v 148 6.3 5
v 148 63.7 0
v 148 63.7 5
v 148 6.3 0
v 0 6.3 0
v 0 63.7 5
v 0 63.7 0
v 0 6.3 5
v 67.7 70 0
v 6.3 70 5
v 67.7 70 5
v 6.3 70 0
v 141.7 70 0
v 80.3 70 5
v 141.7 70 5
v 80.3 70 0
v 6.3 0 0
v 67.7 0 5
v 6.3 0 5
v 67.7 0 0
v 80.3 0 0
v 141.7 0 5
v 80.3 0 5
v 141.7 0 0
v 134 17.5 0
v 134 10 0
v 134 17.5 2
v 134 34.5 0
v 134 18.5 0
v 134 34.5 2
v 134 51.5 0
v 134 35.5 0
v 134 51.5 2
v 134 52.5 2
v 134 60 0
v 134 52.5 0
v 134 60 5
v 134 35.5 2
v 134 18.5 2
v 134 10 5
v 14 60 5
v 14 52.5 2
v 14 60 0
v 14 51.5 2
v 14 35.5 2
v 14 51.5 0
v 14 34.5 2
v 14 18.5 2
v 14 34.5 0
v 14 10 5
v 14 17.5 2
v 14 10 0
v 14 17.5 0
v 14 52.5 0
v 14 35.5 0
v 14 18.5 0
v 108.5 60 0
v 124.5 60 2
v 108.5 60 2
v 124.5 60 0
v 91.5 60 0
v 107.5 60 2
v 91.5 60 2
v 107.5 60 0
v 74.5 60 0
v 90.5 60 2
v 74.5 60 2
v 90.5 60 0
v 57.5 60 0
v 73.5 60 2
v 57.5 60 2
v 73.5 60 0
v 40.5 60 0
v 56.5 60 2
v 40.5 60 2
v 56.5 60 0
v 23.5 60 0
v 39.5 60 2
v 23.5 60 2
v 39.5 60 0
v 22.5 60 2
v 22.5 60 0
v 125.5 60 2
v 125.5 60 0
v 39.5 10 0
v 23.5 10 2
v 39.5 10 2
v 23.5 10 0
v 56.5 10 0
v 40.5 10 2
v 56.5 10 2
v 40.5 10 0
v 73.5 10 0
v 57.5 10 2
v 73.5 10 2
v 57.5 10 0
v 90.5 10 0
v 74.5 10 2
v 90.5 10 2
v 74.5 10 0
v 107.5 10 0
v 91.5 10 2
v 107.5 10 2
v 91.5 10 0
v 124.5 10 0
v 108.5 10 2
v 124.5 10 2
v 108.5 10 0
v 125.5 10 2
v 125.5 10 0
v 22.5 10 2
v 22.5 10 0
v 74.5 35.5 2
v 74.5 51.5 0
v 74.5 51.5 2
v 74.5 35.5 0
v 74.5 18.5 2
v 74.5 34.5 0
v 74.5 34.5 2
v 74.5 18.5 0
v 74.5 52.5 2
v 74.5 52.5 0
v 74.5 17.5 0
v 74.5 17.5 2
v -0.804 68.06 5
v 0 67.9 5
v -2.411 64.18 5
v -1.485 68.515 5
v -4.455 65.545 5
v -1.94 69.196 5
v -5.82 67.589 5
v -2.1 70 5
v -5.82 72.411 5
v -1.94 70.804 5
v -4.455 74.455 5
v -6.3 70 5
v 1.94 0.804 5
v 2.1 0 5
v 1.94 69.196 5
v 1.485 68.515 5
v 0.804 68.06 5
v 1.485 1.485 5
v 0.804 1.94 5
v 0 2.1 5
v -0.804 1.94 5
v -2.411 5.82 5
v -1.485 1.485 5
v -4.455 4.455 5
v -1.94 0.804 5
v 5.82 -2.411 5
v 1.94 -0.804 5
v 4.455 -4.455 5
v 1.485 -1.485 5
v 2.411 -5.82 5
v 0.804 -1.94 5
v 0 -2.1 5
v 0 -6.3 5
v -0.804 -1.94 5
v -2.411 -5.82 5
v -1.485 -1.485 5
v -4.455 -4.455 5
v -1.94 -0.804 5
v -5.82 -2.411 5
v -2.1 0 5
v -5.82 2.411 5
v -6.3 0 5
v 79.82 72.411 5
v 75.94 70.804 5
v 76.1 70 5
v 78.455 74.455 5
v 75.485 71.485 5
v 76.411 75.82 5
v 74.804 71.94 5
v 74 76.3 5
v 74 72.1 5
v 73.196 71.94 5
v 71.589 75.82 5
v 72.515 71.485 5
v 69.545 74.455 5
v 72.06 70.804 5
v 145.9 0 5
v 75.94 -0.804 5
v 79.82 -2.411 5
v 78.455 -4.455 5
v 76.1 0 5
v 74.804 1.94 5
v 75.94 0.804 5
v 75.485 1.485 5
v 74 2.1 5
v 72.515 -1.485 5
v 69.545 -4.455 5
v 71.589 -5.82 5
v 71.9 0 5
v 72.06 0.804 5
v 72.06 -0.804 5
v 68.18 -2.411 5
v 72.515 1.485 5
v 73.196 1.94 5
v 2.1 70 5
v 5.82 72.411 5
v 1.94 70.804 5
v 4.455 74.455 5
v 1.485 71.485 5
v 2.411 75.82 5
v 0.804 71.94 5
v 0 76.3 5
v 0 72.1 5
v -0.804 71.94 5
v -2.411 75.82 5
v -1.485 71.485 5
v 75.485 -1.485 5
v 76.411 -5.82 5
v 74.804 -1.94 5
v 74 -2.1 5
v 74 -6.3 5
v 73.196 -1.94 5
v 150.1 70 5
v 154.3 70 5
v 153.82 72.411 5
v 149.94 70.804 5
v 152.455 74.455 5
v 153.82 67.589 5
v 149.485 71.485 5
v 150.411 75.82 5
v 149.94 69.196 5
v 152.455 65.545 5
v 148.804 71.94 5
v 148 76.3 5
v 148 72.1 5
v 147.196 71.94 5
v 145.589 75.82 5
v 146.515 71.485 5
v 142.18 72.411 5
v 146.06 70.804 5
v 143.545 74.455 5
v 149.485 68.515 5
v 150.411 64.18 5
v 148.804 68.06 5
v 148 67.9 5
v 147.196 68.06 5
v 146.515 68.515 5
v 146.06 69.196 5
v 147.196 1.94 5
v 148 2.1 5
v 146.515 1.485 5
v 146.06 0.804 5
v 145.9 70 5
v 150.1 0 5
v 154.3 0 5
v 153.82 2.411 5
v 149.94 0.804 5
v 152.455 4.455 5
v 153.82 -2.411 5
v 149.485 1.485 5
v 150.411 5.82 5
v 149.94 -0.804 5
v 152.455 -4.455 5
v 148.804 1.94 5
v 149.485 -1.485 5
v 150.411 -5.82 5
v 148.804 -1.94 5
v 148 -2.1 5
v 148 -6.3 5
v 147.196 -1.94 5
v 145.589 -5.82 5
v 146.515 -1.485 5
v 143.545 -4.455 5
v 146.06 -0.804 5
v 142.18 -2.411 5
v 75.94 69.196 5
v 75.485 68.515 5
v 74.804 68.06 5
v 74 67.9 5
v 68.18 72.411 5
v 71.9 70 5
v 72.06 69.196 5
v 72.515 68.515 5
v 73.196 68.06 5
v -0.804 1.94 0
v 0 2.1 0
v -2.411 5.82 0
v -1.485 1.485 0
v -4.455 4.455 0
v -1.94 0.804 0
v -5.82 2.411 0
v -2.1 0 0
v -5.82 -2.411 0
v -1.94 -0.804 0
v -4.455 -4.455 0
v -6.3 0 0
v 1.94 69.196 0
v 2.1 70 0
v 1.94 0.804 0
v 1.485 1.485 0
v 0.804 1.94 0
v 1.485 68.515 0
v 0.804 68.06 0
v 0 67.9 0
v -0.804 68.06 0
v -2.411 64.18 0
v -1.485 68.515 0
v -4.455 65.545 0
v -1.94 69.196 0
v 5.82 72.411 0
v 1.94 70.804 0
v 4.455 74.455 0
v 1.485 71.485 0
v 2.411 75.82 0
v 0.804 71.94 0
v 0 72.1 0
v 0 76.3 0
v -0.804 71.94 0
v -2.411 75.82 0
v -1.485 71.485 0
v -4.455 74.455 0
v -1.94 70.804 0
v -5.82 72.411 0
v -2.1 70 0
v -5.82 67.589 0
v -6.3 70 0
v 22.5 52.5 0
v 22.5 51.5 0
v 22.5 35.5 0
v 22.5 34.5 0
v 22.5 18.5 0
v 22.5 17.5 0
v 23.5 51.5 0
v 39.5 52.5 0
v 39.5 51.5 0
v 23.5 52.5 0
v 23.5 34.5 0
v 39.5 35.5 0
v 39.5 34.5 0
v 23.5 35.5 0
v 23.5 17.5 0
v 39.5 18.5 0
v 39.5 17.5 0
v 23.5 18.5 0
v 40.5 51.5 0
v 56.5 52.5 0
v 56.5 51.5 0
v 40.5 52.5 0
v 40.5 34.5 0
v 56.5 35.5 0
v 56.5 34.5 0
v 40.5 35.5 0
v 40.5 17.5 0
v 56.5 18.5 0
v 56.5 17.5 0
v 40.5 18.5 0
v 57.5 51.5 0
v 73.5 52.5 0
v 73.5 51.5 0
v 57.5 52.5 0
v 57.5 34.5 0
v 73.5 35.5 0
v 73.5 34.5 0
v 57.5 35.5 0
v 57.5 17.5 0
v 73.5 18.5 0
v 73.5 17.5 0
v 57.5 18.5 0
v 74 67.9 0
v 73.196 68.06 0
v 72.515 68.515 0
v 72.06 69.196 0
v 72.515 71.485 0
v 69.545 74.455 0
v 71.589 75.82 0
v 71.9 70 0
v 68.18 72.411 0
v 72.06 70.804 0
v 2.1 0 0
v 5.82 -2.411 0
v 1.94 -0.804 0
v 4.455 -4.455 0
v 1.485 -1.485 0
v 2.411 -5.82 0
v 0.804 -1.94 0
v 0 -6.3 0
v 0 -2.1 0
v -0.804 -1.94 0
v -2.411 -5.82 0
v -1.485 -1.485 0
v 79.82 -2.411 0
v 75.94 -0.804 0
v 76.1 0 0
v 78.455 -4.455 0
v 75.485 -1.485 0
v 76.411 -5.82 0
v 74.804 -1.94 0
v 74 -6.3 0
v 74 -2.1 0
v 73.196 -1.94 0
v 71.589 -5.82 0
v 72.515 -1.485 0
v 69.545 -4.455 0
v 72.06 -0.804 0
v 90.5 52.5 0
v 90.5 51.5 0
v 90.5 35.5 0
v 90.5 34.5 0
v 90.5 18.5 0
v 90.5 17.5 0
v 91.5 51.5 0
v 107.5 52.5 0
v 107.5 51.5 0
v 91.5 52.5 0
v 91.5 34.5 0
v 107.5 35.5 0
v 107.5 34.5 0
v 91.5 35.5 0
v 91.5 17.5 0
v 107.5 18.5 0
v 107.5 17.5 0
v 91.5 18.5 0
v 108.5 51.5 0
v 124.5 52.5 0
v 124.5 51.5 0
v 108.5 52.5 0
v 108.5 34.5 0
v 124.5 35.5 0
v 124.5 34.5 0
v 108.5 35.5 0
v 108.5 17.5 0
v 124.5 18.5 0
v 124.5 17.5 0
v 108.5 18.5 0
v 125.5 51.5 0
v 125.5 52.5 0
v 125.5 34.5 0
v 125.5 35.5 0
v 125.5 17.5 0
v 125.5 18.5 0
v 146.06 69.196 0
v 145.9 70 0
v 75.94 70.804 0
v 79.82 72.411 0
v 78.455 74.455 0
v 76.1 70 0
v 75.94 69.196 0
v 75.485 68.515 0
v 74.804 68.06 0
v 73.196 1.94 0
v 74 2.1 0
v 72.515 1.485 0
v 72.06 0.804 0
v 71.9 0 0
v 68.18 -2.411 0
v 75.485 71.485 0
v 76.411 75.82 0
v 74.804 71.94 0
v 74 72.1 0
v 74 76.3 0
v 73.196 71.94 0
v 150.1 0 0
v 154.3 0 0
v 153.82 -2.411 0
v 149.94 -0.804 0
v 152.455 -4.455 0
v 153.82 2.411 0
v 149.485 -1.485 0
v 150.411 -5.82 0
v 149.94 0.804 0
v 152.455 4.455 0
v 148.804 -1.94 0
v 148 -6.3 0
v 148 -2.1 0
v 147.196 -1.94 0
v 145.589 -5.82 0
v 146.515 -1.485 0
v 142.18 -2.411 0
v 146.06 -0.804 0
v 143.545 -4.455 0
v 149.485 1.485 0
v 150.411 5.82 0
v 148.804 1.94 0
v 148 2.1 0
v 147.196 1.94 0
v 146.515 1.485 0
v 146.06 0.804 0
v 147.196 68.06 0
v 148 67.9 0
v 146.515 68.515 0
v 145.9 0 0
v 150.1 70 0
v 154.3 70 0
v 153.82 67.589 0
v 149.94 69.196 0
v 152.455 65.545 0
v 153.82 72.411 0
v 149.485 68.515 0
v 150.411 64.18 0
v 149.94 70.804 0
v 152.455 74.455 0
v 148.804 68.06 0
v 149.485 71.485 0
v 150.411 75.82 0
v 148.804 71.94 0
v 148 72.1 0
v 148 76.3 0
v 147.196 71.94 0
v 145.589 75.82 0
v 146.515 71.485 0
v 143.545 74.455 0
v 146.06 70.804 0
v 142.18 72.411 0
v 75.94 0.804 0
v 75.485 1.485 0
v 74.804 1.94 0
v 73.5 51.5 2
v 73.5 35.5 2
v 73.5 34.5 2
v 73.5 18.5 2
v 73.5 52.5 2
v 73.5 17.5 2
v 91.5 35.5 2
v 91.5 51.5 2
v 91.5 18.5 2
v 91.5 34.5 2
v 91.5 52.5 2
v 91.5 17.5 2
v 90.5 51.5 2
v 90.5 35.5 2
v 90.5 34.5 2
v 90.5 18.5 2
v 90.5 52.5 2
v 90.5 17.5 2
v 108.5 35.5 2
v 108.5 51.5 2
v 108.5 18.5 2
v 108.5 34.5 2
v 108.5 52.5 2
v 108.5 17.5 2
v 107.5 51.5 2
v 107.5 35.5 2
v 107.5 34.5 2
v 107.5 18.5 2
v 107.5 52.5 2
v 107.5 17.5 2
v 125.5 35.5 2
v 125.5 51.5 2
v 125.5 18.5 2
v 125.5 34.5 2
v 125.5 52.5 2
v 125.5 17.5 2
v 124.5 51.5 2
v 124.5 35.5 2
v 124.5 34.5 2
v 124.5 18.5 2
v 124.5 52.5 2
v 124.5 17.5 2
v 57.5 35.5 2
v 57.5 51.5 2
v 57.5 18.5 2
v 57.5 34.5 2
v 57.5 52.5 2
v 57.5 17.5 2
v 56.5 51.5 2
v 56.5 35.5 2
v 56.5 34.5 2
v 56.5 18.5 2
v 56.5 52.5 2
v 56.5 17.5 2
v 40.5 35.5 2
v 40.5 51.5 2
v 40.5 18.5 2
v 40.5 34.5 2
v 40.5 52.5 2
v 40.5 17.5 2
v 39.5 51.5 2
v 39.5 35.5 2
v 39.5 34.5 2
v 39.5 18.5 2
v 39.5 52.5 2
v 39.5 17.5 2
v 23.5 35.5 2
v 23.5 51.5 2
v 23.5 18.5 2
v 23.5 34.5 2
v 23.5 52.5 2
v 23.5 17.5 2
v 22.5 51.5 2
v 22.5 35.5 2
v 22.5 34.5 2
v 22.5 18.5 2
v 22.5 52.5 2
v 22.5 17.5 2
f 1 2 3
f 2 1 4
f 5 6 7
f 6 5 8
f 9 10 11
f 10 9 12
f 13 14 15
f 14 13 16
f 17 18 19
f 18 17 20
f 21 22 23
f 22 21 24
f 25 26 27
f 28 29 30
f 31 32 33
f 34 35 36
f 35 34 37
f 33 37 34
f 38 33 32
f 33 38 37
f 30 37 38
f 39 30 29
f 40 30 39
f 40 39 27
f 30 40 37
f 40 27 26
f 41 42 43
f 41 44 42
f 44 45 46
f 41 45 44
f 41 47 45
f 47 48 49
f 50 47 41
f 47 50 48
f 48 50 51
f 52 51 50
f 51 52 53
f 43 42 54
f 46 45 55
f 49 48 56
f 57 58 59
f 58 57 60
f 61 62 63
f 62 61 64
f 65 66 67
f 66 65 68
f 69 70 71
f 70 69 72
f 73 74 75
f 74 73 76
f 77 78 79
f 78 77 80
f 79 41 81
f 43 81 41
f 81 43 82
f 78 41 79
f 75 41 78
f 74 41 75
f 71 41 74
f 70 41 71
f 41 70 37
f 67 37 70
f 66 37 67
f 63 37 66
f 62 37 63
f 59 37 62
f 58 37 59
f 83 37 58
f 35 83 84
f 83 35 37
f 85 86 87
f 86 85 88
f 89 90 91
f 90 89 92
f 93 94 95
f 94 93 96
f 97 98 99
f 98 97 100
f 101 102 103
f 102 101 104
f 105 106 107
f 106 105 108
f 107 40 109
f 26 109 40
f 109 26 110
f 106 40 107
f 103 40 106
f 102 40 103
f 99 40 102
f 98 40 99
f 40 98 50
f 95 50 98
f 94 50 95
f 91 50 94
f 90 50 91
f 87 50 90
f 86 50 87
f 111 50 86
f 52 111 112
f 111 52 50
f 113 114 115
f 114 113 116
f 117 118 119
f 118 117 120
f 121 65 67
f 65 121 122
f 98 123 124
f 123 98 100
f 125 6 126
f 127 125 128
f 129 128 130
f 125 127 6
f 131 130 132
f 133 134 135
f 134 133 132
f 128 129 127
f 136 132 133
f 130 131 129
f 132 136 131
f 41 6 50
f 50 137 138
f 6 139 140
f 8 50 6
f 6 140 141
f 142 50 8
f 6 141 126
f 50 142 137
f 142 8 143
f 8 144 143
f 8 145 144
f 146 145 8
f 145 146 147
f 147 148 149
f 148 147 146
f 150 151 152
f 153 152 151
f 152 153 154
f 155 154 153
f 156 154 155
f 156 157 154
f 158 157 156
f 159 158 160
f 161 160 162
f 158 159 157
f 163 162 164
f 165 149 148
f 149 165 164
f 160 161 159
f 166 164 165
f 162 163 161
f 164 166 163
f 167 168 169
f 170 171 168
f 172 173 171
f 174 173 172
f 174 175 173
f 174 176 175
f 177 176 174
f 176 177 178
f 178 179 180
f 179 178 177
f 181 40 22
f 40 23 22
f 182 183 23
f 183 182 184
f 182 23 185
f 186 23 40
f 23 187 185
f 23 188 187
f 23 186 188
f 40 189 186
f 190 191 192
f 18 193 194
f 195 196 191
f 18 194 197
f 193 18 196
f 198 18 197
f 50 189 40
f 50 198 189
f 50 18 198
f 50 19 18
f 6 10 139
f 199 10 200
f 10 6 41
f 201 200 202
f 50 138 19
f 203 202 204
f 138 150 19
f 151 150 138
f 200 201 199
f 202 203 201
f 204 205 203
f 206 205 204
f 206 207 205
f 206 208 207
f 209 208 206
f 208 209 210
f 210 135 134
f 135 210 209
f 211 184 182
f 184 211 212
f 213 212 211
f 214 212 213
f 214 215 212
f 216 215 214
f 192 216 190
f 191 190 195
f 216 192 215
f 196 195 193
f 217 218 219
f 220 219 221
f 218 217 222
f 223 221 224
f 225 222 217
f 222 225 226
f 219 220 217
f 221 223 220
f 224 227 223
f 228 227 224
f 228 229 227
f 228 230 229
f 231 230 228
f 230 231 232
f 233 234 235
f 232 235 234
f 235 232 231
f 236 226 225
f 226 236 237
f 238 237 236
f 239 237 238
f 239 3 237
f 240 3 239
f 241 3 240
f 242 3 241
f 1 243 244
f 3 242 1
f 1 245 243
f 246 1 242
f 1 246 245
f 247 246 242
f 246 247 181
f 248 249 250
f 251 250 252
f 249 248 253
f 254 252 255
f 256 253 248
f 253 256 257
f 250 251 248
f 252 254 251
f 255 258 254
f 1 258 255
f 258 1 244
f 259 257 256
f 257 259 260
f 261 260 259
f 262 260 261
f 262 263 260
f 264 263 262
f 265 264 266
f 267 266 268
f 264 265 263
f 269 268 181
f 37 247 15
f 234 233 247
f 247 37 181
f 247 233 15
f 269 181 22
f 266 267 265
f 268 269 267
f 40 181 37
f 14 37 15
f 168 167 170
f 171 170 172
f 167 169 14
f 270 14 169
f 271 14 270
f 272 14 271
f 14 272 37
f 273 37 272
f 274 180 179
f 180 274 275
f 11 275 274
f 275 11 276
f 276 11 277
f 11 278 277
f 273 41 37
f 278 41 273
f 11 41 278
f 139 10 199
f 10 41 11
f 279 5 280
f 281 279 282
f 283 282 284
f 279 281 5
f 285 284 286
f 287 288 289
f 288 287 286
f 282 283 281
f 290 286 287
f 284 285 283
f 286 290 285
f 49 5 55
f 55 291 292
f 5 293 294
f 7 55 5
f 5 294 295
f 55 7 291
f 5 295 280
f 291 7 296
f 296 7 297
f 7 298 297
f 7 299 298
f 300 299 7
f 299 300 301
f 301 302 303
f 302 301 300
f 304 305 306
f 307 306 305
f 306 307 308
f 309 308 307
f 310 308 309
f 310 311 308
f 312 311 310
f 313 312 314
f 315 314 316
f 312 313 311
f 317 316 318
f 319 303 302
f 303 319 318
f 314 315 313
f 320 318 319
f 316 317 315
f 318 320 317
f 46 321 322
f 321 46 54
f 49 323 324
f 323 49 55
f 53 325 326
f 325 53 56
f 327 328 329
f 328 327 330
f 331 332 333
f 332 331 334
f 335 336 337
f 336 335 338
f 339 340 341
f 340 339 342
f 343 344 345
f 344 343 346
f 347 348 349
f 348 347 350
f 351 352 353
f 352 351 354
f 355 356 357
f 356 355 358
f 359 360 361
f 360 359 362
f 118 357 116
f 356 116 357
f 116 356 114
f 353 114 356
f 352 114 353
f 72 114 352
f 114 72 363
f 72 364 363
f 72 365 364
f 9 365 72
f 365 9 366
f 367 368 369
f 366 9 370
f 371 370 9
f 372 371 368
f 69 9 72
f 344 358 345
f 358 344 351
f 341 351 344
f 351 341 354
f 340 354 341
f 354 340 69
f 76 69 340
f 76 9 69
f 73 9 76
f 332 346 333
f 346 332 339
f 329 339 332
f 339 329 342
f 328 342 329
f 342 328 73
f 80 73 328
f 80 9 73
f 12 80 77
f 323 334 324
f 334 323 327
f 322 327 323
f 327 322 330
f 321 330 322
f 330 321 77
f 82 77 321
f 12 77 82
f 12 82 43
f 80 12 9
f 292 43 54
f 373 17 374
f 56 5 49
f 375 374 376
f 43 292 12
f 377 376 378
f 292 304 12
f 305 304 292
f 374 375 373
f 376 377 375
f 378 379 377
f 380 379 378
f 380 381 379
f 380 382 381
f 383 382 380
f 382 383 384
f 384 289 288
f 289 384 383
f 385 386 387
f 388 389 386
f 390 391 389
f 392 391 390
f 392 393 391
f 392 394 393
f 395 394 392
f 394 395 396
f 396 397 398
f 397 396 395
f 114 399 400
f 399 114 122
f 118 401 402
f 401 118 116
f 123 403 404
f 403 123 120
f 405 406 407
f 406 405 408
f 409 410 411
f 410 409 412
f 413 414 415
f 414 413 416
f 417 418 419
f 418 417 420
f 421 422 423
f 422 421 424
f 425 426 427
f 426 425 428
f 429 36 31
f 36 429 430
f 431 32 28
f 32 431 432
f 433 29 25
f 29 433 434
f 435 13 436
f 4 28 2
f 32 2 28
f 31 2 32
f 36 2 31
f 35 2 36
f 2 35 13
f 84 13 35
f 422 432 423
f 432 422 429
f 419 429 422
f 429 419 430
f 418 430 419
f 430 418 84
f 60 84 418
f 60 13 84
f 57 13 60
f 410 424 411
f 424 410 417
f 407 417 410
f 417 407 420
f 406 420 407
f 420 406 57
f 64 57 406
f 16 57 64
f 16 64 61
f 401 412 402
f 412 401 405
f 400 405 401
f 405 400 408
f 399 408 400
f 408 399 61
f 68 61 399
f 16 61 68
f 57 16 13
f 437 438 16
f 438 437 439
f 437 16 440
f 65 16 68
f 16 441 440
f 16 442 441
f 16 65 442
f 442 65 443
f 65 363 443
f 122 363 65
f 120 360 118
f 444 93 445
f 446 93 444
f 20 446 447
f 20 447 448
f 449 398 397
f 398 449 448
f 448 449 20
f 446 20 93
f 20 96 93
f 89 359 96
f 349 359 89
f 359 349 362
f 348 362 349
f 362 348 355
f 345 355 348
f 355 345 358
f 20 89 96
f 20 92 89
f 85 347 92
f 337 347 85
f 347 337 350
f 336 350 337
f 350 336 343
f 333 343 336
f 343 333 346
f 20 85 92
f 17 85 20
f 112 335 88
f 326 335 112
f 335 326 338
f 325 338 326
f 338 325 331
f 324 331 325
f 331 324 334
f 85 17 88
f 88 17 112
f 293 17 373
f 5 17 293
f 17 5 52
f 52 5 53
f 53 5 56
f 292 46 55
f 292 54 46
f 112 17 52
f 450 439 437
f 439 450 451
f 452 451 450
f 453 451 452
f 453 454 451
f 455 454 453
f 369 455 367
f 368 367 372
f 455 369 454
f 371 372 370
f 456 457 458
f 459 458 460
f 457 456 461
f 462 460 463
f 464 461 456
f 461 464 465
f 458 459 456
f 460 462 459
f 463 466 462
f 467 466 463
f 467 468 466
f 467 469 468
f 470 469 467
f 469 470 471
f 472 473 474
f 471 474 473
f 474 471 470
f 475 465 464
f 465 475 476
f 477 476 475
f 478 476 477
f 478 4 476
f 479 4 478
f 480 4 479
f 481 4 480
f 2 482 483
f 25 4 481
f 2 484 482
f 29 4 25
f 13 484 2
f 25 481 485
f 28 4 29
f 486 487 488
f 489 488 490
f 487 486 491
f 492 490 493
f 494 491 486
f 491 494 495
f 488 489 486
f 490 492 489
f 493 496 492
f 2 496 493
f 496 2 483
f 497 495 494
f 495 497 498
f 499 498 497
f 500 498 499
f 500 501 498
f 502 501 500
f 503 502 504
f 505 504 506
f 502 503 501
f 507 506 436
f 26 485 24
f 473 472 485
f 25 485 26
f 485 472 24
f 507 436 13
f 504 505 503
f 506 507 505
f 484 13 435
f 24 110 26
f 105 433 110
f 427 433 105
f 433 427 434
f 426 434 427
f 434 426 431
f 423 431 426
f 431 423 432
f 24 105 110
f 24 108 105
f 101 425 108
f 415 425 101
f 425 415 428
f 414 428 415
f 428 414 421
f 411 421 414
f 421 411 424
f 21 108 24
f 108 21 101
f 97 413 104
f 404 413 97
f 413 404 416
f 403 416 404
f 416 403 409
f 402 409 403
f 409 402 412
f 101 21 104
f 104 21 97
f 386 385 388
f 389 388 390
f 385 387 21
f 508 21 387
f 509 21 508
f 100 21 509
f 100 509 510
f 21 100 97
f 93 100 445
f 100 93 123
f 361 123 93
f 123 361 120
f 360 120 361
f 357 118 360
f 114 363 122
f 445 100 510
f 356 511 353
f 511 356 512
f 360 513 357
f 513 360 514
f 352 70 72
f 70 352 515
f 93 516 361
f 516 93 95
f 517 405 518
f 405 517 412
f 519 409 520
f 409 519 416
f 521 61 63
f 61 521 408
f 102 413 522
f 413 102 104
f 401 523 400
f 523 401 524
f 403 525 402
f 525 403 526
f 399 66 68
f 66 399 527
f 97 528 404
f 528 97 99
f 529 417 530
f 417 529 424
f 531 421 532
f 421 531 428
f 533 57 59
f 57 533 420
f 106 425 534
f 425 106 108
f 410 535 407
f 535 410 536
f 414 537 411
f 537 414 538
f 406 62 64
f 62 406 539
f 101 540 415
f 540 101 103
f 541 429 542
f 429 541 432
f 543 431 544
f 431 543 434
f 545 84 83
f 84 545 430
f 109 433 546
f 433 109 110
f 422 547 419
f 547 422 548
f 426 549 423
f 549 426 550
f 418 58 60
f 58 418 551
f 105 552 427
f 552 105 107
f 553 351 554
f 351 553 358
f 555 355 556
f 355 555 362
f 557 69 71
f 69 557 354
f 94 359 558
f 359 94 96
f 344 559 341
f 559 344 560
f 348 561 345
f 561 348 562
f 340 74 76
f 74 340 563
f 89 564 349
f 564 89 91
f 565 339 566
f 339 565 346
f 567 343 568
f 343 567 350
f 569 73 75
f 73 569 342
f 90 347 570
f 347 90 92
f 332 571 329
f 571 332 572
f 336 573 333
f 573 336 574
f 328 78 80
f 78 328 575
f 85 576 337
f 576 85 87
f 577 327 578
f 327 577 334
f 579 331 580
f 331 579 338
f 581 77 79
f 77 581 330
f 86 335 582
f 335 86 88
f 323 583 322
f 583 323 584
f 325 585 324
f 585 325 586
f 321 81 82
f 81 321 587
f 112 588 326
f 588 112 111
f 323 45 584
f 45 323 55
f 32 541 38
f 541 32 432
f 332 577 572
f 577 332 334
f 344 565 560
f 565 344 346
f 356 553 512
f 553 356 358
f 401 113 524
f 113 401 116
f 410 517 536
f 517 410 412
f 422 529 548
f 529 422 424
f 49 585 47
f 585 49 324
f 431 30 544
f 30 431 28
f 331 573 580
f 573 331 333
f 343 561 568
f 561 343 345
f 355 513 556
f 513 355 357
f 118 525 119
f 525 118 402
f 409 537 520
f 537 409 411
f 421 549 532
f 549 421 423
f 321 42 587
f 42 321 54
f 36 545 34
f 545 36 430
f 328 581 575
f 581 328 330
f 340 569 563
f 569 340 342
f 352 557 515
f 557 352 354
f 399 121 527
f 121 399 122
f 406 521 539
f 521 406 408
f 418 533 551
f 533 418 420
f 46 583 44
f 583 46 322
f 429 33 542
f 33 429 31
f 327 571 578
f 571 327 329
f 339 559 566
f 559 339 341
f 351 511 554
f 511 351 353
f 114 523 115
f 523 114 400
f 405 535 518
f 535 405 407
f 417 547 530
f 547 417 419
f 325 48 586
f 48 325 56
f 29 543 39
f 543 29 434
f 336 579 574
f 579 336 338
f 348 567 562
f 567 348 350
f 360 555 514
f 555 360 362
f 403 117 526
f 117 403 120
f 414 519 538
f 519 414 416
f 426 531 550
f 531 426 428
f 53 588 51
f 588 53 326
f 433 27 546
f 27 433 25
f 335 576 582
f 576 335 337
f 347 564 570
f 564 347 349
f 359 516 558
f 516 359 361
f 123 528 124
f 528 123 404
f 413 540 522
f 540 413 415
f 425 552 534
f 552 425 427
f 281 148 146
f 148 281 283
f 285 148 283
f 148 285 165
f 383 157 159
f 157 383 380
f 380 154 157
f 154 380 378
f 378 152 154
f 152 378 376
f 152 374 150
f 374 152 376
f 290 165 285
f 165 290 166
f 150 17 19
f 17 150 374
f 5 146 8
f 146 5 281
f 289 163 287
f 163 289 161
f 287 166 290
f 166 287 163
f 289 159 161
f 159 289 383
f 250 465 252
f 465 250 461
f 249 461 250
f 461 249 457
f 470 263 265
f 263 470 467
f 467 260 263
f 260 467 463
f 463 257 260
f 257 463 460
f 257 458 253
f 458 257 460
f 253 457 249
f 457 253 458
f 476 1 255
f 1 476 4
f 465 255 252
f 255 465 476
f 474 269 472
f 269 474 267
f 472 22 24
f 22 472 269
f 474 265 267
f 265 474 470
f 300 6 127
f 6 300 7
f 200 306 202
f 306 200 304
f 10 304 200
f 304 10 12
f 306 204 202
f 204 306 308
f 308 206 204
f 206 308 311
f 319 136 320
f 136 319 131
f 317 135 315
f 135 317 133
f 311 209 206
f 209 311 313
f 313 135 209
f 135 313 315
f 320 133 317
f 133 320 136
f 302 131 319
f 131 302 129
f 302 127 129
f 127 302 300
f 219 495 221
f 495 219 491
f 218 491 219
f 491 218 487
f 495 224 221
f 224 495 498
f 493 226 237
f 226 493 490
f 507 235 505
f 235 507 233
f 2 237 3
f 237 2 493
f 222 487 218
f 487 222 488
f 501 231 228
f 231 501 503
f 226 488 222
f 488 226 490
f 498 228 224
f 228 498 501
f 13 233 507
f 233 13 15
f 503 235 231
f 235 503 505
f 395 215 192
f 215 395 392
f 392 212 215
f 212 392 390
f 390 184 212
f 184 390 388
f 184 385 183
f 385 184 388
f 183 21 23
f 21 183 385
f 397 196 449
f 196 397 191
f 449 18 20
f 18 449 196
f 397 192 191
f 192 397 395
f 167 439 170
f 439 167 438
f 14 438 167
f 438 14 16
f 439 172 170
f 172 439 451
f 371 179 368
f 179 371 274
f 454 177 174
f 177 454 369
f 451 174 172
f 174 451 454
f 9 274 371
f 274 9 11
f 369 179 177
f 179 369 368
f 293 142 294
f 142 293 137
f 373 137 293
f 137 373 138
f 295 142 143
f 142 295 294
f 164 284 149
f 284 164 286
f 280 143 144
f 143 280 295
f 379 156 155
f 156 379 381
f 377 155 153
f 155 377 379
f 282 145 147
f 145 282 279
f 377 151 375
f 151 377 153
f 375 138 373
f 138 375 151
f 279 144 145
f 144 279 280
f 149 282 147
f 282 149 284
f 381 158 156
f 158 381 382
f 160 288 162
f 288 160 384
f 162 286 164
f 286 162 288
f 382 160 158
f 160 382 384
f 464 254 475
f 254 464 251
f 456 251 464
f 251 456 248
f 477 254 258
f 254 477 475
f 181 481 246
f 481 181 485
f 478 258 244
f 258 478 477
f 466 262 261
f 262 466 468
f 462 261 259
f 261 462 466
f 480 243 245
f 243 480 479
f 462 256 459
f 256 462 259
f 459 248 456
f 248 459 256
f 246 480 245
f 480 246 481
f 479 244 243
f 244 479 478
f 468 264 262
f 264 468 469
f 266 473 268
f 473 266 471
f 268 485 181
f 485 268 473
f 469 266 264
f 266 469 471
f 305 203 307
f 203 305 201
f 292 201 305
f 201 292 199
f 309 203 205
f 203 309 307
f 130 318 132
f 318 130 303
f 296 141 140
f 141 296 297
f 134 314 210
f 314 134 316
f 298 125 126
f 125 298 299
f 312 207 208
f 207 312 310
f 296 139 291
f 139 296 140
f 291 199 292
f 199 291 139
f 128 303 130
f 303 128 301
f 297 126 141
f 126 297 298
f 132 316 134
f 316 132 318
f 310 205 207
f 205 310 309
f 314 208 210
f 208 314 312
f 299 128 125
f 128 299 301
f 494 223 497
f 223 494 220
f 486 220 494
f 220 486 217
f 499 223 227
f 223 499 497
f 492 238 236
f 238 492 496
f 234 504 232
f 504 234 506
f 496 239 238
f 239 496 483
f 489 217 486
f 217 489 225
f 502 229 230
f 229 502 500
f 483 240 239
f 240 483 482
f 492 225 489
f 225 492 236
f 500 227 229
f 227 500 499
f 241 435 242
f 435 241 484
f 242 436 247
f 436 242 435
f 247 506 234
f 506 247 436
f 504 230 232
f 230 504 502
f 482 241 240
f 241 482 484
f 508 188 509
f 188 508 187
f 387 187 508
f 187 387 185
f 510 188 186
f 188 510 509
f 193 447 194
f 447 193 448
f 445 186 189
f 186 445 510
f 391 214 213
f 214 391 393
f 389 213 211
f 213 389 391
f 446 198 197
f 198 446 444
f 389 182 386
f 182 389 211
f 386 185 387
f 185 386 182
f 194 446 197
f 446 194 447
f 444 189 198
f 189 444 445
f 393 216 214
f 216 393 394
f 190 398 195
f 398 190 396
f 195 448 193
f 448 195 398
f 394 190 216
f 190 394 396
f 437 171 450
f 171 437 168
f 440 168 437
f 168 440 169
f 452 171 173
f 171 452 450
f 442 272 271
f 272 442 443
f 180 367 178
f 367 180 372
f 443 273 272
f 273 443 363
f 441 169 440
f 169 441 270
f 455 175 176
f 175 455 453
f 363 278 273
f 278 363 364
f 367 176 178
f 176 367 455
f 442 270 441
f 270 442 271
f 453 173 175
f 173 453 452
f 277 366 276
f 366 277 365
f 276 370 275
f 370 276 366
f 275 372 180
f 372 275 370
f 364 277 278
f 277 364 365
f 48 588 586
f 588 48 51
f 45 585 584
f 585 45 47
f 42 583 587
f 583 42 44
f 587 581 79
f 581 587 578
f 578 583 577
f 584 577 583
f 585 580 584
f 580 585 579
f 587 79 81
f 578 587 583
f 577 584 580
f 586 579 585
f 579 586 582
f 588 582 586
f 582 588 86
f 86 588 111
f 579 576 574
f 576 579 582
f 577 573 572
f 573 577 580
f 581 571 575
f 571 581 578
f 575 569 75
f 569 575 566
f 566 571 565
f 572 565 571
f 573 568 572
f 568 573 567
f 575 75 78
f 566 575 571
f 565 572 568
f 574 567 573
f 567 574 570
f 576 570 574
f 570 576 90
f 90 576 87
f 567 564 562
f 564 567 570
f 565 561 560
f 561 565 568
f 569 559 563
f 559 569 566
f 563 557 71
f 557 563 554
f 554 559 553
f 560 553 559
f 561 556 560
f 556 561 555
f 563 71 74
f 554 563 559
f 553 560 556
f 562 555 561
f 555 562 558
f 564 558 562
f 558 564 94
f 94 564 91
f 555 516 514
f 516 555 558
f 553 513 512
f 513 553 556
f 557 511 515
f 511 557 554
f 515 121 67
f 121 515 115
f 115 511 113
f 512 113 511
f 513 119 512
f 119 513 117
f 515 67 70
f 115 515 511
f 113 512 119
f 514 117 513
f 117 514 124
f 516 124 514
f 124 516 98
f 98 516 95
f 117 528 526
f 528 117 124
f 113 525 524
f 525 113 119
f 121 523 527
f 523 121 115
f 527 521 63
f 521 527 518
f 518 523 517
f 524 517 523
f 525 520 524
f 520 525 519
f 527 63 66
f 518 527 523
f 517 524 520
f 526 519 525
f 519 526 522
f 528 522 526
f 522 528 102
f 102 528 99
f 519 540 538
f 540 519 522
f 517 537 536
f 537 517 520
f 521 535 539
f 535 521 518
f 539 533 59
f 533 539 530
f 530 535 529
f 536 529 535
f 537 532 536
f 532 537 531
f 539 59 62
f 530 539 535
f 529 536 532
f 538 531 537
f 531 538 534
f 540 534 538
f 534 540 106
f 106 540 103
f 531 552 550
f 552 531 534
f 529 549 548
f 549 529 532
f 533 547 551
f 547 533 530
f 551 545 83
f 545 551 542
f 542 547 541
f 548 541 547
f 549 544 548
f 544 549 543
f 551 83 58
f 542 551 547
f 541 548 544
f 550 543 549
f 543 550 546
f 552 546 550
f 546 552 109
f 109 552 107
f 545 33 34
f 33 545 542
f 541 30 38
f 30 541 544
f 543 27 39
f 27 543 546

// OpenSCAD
// file: grid.scad
/* This module creates grids. */

module grid(
   gridX, 
   gridY, 
   borderX, 
   borderY, 
   meshSolid,    // width of solid part of grid
   meshSpace,    // width of space part of grid
   thickness) {  // z height 

   /* Calculate the size of the dimensions of the meshed area. */
   meshX=gridX-(borderX*2);
   meshY=gridY-(borderY*2);

   echo (meshX,  meshY);

   /* Calculate the number of lines in the meshed area. */
   nX=floor(meshX/(meshSolid+meshSpace));
   nY=floor(meshY/(meshSolid+meshSpace));
   gridSize = meshSolid + meshSpace;
   echo (nX, nY, gridSize);


   intersection () {

      union() {
         /* 
          *  Draw the border box centered. 
          */
         difference() {
            cube (size=[gridX,gridY,thickness+ 2], center=true);
            cube (size=[meshX,meshY,thickness+ 2], center=true);
         } /* enddifference */
         
      
         /* 
          *  Draw the grid centered. 
          */
      
         /* Draw the lines parallel to y axis. */
         translate([-1 * (meshSolid / 2), 0, -1 * (thickness / 2)])
            union() {
               for (i = [0 : ceil(nX / 2)]) {
                  translate([i*(meshSolid+meshSpace), -1 * (gridY / 2), 0]) 
                     cube(size=[meshSolid, gridY, thickness]);
               } /* endfor */
               for (i = [0 : ceil(nX / 2)]) {
                  translate([-1 * i*(meshSolid+meshSpace), -1 * (gridY / 2), 0]) 
                     cube(size=[meshSolid, gridY, thickness]);
               } /* endfor */
            } /* endunion */
         
         /* Draw the lines parallel to the x axis. */
         translate([0, -1 * (meshSolid / 2), -1 * (thickness / 2)])
            union() {
               for (i = [0 : ceil(nY / 2)]) {
                  translate([-1 * (gridX / 2), i*(meshSolid+meshSpace), 0]) 
                     cube(size=[gridX, meshSolid, thickness]);
               } /* endfor */
               for (i = [0 : ceil(nY / 2)]) {
                  translate([-1 * (gridX / 2), -1 * i*(meshSolid+meshSpace), 0]) 
                     cube(size=[gridX, meshSolid, thickness]);
               } /* endfor */
            } /* endunion */
      } /* endunion */

      /* Slice off all the extra line widths on the edges. */
      cube (size=[gridX,gridY,thickness], center=true);

   } /* endintersection */

} /* endmodule */


grid(21, 41, 0, 0, 2, 8, 5);
   
// main file
/* This is a jig for holding the rpi door controller PCB
   on a Sherline 5000 mill for isolation milling.  */
use <MCAD/nuts_and_bolts.scad>;
use <grid.scad>;

$fn = 16;

/* Set overall piece dimensions. */
x = 148;
y = 70;
z = 5;
x_border = 14;
y_border = 10;
grid_size = 17;
grid_line_width = 1;

/* The grid pocket is how much to drop the top of the grid by.  This
   allows for some padding to be added underneath the circuit board. */
grid_pocket = 3;


/* Set the screw size in mm. */
screw_size = 4.2;



/****** Calculated Values *******/
mount_hole_x_offset = x_border / 2; 


difference() {

   union() {
      translate([(x / 2), y / 2, (z / 2)])
         grid(x, y, x_border, y_border, grid_line_width, 
              grid_size - grid_line_width, z);
   
      cylinder(h = z, r = screw_size * 1.5);
      translate([x, 0, 0]) cylinder(h = z, r = screw_size * 1.5);
      translate([0, y, 0]) cylinder(h = z, r = screw_size * 1.5);
      translate([x, y, 0]) cylinder(h = z, r = screw_size * 1.5);
      translate([x / 2, 0, 0]) cylinder(h = z, r = screw_size * 1.5);
      translate([x / 2, y, 0]) cylinder(h = z, r = screw_size * 1.5);
   } /* endunion */
   

   translate([0, 0, 0])
      cylinder(h = z, r = screw_size / 2);

   translate([x, 0, 0])
      cylinder(h = z, r = screw_size / 2);

   translate([0, y, 0])
      cylinder(h = z, r = screw_size / 2);

   translate([x, y, 0])
      cylinder(h = z, r = screw_size / 2);

   translate([x / 2, 0, 0])
      cylinder(h = z, r = screw_size / 2);

   translate([x / 2, y, 0]) 
      cylinder(h = z, r = screw_size / 2);

   /* Subtract the grid pocket. */
   translate([x_border, y_border, z - grid_pocket])
      cube(size=[x - (x_border * 2), y - (y_border * 2), grid_pocket]);
} /* enddifference */
